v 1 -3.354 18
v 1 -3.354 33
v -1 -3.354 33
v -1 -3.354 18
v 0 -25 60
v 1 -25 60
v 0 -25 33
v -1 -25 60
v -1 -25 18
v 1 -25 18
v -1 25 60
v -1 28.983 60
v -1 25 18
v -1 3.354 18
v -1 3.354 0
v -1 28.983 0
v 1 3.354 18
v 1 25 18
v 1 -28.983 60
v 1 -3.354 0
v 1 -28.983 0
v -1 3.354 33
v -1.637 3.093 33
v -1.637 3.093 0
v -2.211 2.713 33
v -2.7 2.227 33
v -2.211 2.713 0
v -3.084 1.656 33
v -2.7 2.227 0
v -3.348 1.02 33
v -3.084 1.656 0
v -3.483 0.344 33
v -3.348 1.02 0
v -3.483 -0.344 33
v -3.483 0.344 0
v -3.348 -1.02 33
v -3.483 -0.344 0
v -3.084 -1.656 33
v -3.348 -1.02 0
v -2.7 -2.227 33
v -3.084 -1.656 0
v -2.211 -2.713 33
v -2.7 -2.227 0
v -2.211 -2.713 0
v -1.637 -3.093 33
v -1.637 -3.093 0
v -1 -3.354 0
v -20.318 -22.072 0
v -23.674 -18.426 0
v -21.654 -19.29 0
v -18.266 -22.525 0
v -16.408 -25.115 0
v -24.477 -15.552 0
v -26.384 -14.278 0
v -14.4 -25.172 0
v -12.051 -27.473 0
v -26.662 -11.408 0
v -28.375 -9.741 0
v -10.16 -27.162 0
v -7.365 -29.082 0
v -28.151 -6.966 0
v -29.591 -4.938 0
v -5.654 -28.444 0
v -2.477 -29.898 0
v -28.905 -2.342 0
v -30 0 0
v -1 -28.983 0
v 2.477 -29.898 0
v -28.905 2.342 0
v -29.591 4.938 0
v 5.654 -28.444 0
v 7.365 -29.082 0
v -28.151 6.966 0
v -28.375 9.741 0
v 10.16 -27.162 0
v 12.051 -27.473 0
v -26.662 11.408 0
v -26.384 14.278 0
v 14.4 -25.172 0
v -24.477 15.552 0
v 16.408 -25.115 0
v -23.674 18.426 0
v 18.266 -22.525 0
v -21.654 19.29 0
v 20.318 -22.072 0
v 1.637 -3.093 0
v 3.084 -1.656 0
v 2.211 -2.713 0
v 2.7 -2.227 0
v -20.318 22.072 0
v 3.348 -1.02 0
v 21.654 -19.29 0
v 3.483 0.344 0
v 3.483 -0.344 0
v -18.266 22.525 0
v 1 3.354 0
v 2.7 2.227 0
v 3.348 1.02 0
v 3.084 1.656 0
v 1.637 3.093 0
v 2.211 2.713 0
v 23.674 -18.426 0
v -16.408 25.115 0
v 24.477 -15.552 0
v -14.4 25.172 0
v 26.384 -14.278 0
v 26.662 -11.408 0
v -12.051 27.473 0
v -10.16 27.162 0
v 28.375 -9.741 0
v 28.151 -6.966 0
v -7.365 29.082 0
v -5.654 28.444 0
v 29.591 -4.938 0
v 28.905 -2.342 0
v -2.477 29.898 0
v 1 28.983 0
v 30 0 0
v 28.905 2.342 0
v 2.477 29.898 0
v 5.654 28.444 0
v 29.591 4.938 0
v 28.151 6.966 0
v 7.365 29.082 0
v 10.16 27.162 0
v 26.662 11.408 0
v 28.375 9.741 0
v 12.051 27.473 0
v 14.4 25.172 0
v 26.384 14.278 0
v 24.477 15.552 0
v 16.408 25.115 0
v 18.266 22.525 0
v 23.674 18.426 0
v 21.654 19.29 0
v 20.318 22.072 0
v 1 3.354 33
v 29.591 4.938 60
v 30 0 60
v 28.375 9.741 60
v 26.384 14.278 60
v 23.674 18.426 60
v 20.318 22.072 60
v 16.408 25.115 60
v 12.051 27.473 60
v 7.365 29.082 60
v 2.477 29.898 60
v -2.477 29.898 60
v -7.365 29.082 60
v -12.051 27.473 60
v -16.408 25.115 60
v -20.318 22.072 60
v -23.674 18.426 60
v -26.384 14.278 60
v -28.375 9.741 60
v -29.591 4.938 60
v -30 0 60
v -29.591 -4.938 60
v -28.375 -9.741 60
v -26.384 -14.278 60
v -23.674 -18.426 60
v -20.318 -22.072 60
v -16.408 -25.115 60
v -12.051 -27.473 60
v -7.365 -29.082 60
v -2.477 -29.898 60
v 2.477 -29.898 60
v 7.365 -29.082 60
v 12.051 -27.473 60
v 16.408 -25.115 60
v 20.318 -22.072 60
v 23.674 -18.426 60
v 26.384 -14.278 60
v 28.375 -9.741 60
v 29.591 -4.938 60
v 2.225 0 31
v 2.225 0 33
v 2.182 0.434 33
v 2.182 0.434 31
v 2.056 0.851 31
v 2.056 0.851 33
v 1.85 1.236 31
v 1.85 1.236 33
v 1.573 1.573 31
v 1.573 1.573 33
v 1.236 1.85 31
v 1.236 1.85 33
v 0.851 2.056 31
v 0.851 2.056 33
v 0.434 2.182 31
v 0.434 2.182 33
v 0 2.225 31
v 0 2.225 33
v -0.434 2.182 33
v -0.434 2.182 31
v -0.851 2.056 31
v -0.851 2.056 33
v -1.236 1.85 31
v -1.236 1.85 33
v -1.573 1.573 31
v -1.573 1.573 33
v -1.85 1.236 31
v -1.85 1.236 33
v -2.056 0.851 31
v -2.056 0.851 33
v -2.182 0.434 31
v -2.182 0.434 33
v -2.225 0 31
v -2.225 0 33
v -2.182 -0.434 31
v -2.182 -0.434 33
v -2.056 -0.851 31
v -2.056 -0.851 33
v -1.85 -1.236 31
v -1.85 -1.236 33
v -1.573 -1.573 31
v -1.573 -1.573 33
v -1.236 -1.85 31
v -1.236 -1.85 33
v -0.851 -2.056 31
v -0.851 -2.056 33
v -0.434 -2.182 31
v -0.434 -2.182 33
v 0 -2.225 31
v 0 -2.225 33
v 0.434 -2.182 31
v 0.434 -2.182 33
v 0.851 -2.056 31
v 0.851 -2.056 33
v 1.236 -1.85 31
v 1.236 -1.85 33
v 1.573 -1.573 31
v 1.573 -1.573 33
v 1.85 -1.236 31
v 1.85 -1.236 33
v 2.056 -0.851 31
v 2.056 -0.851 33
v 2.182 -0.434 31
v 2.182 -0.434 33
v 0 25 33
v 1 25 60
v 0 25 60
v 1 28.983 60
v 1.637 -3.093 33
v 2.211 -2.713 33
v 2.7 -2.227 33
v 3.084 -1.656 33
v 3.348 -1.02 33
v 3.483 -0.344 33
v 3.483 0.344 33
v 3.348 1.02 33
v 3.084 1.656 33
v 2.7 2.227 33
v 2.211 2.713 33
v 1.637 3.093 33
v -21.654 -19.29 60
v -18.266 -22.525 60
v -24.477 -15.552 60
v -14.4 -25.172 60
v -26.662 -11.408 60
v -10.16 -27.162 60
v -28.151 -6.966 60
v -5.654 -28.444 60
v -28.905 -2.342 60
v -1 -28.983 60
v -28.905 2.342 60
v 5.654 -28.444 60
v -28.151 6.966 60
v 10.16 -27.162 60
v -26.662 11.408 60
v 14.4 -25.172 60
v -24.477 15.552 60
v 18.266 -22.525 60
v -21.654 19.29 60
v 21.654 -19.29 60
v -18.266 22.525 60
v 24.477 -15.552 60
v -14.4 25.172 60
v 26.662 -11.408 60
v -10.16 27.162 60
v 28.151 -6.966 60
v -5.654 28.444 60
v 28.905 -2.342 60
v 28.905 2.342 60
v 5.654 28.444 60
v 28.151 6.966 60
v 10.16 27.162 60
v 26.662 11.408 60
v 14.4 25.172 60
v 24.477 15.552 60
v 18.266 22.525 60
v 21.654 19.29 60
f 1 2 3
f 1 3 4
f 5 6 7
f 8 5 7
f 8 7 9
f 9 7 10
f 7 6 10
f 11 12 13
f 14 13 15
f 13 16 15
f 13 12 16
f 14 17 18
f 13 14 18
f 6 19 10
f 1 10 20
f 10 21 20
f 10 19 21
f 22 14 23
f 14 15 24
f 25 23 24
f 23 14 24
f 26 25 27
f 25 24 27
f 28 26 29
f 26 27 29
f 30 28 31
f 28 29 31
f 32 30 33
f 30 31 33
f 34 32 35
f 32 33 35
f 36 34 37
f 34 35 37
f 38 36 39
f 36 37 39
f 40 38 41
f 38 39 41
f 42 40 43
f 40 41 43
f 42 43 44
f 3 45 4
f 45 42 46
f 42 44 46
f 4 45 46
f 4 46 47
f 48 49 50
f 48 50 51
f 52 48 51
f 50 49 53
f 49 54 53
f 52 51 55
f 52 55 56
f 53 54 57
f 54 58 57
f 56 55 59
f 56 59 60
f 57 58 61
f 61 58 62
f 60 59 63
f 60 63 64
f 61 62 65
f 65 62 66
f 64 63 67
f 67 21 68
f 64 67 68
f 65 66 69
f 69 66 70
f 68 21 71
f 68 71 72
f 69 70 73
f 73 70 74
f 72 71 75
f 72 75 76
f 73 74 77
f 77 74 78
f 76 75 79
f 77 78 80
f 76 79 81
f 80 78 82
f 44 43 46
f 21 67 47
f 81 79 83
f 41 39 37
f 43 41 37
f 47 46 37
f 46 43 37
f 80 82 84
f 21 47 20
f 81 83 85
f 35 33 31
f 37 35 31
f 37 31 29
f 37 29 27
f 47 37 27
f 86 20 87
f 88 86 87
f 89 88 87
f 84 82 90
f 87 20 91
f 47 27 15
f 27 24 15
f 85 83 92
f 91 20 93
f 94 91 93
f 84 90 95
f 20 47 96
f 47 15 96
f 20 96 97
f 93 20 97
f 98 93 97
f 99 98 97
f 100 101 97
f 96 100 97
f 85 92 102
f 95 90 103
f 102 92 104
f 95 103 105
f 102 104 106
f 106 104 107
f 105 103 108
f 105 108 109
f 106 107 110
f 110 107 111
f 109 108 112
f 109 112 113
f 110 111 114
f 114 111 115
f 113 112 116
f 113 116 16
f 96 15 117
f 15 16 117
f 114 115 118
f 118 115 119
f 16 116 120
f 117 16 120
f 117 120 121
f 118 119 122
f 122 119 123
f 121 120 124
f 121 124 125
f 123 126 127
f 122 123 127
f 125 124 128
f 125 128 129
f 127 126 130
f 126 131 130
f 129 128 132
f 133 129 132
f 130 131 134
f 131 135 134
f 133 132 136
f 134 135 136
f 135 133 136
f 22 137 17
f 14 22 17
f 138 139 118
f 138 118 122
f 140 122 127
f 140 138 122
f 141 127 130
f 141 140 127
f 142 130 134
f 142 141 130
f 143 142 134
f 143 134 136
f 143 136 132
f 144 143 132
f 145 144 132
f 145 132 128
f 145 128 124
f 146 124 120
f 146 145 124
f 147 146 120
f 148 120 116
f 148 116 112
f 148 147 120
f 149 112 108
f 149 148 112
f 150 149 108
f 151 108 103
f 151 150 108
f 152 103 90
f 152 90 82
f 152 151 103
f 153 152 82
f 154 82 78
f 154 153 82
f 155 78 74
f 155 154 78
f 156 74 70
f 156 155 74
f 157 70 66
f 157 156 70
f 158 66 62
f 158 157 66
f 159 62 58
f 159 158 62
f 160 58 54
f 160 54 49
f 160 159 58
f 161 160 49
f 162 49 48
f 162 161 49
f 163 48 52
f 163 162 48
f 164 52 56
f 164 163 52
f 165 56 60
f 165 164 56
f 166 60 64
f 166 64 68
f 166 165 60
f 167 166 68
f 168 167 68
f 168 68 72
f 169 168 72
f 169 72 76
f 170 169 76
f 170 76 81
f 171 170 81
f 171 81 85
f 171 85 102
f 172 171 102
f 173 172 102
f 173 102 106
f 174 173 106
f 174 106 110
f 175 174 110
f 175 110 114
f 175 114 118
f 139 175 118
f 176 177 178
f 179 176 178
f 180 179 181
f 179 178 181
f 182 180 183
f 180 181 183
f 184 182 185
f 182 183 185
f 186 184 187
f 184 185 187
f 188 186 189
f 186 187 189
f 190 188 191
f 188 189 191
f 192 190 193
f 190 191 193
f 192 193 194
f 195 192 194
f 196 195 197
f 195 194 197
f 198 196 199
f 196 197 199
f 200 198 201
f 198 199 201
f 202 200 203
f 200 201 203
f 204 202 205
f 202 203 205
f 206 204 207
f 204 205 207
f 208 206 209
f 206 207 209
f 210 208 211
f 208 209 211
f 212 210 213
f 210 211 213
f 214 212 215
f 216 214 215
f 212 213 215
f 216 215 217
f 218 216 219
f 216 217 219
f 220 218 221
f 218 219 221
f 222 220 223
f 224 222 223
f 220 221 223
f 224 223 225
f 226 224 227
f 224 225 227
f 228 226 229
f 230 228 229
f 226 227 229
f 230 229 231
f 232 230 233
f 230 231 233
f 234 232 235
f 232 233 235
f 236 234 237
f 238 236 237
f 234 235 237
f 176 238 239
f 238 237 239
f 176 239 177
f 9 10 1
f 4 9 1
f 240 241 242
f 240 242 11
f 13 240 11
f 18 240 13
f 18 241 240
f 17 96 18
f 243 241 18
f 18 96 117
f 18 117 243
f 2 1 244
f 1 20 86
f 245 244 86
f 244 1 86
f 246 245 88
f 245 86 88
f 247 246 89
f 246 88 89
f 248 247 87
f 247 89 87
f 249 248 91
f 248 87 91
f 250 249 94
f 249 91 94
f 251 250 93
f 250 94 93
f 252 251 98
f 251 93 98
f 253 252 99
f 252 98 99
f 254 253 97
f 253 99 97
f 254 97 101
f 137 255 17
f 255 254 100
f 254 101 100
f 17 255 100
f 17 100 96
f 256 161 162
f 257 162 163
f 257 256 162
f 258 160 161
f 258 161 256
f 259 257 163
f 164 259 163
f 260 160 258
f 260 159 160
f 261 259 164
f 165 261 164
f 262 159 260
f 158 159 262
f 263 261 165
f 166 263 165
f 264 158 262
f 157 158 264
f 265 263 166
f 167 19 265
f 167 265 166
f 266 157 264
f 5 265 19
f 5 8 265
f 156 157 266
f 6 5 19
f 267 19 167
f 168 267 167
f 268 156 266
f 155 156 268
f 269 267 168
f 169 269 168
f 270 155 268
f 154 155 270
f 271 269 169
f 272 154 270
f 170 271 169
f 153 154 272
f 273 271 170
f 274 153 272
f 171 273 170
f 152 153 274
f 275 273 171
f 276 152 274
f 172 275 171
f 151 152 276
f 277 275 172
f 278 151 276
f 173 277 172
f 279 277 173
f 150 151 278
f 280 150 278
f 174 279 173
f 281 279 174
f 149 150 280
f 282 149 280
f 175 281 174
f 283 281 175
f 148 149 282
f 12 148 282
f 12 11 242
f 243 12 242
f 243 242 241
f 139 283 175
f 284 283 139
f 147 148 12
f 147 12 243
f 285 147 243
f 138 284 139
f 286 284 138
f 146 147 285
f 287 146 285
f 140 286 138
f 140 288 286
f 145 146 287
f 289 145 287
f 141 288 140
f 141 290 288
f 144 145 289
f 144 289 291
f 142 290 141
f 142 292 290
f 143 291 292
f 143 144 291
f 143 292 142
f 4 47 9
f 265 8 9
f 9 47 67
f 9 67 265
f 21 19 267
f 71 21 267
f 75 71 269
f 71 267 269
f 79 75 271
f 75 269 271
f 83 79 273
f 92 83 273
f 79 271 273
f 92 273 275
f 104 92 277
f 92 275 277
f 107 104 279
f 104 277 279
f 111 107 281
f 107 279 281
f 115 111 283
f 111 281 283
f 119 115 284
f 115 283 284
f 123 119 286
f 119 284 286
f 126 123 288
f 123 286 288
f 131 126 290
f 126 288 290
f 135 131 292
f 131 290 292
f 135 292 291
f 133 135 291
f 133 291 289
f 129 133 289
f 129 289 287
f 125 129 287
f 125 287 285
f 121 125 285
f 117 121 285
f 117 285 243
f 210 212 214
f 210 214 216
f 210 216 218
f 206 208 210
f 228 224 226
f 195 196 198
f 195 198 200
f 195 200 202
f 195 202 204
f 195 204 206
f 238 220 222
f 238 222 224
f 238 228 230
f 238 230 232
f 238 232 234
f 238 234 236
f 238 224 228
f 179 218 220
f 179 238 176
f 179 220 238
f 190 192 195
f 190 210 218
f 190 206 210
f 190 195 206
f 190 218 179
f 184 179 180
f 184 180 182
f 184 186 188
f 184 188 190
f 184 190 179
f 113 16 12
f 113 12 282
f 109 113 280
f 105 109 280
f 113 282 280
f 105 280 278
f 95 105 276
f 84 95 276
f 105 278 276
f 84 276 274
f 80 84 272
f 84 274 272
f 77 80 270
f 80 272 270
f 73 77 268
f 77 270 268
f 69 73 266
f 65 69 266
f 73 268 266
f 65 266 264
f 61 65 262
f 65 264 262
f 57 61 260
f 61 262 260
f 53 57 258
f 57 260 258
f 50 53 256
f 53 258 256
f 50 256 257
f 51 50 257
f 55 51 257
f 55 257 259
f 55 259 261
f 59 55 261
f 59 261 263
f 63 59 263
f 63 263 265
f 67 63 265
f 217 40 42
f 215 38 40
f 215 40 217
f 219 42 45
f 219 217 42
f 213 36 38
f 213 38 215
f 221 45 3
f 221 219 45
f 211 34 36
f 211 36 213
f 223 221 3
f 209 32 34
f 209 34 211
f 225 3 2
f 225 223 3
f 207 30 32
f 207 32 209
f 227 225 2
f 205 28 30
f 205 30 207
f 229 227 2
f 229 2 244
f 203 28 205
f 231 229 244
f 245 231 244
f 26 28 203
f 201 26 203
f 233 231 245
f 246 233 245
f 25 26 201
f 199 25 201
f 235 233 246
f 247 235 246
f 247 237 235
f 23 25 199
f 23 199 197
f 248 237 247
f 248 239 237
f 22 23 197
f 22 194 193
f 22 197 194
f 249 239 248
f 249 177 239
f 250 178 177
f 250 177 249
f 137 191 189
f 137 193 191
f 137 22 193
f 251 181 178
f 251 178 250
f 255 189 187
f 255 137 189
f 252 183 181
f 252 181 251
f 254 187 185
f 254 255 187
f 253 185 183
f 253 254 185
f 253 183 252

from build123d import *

# Parameters (mm, degrees)
BOSS_EXTRU_1_DEPTH      = 60
ESQUISSE2_R             = 30
ESQUISSE2_R_2           = 29
BOSS_EXTRU_2_DEPTH      = 60
ESQUISSE3_R             = 25
ENL_V_MAT_EXTRU_1_DEPTH = 27
ESQUISSE6_R             = 2.225
ENL_V_MAT_EXTRU_3_DEPTH = 2
ESQUISSE10_W            = 42
ESQUISSE10_H            = 21.645898034
ENL_V_MAT_EXTRU_7_DEPTH = 5


with BuildPart() as part:
    # Esquisse1 → Boss.-Extru.1 (new body)
    with BuildSketch(Plane.XY):
        with BuildLine():
            Line((1, -15.006468588), (1, -3.354101966))
            ThreePointArc((1, -3.354101966), (3.5, 0), (1, 3.354101966))
            Line((1, 3.354101966), (1, 29.5))
            Line((1, 29.5), (-1, 29.5))
            Line((-1, 29.5), (-1, 3.354101966))
            ThreePointArc((-1, 3.354101966), (-3.5, 0), (-1, -3.354101966))
            Line((-1, -3.354101966), (-1, -29.5))
            Line((-1, -29.5), (1, -29.5))
            Line((1, -29.5), (1, -15.006468588))
        make_face()
    extrude(amount=BOSS_EXTRU_1_DEPTH)

    # Esquisse2 → Boss.-Extru.2 (add)
    with BuildSketch(Plane.XY.offset(60)):
        Circle(ESQUISSE2_R)
        Circle(ESQUISSE2_R_2, mode=Mode.SUBTRACT)
    extrude(amount=-BOSS_EXTRU_2_DEPTH)

    # Esquisse3 → Enlèv. mat.-Extru.1 (cut)
    with BuildSketch(Plane.XY.offset(60)):
        Circle(ESQUISSE3_R)
    extrude(amount=-ENL_V_MAT_EXTRU_1_DEPTH, mode=Mode.SUBTRACT)

    # Esquisse6 → Enlèv. mat.-Extru.3 (cut)
    with BuildSketch(Plane.XY.offset(33)):
        Circle(ESQUISSE6_R)
    extrude(amount=-ENL_V_MAT_EXTRU_3_DEPTH, mode=Mode.SUBTRACT)

    # Esquisse10 → Enlèv. mat.-Extru.7 (cut)
    with BuildSketch(Plane(origin=(1, 0, 0), x_dir=(0, 0, -1), z_dir=(1, 0, 0))):
        with Locations((-39, -14.177050983)):
            Rectangle(ESQUISSE10_W, ESQUISSE10_H)
        with Locations((-39, 14.177050983)):
            Rectangle(ESQUISSE10_W, ESQUISSE10_H)
    extrude(amount=-ENL_V_MAT_EXTRU_7_DEPTH, mode=Mode.SUBTRACT)


solid = part.part
